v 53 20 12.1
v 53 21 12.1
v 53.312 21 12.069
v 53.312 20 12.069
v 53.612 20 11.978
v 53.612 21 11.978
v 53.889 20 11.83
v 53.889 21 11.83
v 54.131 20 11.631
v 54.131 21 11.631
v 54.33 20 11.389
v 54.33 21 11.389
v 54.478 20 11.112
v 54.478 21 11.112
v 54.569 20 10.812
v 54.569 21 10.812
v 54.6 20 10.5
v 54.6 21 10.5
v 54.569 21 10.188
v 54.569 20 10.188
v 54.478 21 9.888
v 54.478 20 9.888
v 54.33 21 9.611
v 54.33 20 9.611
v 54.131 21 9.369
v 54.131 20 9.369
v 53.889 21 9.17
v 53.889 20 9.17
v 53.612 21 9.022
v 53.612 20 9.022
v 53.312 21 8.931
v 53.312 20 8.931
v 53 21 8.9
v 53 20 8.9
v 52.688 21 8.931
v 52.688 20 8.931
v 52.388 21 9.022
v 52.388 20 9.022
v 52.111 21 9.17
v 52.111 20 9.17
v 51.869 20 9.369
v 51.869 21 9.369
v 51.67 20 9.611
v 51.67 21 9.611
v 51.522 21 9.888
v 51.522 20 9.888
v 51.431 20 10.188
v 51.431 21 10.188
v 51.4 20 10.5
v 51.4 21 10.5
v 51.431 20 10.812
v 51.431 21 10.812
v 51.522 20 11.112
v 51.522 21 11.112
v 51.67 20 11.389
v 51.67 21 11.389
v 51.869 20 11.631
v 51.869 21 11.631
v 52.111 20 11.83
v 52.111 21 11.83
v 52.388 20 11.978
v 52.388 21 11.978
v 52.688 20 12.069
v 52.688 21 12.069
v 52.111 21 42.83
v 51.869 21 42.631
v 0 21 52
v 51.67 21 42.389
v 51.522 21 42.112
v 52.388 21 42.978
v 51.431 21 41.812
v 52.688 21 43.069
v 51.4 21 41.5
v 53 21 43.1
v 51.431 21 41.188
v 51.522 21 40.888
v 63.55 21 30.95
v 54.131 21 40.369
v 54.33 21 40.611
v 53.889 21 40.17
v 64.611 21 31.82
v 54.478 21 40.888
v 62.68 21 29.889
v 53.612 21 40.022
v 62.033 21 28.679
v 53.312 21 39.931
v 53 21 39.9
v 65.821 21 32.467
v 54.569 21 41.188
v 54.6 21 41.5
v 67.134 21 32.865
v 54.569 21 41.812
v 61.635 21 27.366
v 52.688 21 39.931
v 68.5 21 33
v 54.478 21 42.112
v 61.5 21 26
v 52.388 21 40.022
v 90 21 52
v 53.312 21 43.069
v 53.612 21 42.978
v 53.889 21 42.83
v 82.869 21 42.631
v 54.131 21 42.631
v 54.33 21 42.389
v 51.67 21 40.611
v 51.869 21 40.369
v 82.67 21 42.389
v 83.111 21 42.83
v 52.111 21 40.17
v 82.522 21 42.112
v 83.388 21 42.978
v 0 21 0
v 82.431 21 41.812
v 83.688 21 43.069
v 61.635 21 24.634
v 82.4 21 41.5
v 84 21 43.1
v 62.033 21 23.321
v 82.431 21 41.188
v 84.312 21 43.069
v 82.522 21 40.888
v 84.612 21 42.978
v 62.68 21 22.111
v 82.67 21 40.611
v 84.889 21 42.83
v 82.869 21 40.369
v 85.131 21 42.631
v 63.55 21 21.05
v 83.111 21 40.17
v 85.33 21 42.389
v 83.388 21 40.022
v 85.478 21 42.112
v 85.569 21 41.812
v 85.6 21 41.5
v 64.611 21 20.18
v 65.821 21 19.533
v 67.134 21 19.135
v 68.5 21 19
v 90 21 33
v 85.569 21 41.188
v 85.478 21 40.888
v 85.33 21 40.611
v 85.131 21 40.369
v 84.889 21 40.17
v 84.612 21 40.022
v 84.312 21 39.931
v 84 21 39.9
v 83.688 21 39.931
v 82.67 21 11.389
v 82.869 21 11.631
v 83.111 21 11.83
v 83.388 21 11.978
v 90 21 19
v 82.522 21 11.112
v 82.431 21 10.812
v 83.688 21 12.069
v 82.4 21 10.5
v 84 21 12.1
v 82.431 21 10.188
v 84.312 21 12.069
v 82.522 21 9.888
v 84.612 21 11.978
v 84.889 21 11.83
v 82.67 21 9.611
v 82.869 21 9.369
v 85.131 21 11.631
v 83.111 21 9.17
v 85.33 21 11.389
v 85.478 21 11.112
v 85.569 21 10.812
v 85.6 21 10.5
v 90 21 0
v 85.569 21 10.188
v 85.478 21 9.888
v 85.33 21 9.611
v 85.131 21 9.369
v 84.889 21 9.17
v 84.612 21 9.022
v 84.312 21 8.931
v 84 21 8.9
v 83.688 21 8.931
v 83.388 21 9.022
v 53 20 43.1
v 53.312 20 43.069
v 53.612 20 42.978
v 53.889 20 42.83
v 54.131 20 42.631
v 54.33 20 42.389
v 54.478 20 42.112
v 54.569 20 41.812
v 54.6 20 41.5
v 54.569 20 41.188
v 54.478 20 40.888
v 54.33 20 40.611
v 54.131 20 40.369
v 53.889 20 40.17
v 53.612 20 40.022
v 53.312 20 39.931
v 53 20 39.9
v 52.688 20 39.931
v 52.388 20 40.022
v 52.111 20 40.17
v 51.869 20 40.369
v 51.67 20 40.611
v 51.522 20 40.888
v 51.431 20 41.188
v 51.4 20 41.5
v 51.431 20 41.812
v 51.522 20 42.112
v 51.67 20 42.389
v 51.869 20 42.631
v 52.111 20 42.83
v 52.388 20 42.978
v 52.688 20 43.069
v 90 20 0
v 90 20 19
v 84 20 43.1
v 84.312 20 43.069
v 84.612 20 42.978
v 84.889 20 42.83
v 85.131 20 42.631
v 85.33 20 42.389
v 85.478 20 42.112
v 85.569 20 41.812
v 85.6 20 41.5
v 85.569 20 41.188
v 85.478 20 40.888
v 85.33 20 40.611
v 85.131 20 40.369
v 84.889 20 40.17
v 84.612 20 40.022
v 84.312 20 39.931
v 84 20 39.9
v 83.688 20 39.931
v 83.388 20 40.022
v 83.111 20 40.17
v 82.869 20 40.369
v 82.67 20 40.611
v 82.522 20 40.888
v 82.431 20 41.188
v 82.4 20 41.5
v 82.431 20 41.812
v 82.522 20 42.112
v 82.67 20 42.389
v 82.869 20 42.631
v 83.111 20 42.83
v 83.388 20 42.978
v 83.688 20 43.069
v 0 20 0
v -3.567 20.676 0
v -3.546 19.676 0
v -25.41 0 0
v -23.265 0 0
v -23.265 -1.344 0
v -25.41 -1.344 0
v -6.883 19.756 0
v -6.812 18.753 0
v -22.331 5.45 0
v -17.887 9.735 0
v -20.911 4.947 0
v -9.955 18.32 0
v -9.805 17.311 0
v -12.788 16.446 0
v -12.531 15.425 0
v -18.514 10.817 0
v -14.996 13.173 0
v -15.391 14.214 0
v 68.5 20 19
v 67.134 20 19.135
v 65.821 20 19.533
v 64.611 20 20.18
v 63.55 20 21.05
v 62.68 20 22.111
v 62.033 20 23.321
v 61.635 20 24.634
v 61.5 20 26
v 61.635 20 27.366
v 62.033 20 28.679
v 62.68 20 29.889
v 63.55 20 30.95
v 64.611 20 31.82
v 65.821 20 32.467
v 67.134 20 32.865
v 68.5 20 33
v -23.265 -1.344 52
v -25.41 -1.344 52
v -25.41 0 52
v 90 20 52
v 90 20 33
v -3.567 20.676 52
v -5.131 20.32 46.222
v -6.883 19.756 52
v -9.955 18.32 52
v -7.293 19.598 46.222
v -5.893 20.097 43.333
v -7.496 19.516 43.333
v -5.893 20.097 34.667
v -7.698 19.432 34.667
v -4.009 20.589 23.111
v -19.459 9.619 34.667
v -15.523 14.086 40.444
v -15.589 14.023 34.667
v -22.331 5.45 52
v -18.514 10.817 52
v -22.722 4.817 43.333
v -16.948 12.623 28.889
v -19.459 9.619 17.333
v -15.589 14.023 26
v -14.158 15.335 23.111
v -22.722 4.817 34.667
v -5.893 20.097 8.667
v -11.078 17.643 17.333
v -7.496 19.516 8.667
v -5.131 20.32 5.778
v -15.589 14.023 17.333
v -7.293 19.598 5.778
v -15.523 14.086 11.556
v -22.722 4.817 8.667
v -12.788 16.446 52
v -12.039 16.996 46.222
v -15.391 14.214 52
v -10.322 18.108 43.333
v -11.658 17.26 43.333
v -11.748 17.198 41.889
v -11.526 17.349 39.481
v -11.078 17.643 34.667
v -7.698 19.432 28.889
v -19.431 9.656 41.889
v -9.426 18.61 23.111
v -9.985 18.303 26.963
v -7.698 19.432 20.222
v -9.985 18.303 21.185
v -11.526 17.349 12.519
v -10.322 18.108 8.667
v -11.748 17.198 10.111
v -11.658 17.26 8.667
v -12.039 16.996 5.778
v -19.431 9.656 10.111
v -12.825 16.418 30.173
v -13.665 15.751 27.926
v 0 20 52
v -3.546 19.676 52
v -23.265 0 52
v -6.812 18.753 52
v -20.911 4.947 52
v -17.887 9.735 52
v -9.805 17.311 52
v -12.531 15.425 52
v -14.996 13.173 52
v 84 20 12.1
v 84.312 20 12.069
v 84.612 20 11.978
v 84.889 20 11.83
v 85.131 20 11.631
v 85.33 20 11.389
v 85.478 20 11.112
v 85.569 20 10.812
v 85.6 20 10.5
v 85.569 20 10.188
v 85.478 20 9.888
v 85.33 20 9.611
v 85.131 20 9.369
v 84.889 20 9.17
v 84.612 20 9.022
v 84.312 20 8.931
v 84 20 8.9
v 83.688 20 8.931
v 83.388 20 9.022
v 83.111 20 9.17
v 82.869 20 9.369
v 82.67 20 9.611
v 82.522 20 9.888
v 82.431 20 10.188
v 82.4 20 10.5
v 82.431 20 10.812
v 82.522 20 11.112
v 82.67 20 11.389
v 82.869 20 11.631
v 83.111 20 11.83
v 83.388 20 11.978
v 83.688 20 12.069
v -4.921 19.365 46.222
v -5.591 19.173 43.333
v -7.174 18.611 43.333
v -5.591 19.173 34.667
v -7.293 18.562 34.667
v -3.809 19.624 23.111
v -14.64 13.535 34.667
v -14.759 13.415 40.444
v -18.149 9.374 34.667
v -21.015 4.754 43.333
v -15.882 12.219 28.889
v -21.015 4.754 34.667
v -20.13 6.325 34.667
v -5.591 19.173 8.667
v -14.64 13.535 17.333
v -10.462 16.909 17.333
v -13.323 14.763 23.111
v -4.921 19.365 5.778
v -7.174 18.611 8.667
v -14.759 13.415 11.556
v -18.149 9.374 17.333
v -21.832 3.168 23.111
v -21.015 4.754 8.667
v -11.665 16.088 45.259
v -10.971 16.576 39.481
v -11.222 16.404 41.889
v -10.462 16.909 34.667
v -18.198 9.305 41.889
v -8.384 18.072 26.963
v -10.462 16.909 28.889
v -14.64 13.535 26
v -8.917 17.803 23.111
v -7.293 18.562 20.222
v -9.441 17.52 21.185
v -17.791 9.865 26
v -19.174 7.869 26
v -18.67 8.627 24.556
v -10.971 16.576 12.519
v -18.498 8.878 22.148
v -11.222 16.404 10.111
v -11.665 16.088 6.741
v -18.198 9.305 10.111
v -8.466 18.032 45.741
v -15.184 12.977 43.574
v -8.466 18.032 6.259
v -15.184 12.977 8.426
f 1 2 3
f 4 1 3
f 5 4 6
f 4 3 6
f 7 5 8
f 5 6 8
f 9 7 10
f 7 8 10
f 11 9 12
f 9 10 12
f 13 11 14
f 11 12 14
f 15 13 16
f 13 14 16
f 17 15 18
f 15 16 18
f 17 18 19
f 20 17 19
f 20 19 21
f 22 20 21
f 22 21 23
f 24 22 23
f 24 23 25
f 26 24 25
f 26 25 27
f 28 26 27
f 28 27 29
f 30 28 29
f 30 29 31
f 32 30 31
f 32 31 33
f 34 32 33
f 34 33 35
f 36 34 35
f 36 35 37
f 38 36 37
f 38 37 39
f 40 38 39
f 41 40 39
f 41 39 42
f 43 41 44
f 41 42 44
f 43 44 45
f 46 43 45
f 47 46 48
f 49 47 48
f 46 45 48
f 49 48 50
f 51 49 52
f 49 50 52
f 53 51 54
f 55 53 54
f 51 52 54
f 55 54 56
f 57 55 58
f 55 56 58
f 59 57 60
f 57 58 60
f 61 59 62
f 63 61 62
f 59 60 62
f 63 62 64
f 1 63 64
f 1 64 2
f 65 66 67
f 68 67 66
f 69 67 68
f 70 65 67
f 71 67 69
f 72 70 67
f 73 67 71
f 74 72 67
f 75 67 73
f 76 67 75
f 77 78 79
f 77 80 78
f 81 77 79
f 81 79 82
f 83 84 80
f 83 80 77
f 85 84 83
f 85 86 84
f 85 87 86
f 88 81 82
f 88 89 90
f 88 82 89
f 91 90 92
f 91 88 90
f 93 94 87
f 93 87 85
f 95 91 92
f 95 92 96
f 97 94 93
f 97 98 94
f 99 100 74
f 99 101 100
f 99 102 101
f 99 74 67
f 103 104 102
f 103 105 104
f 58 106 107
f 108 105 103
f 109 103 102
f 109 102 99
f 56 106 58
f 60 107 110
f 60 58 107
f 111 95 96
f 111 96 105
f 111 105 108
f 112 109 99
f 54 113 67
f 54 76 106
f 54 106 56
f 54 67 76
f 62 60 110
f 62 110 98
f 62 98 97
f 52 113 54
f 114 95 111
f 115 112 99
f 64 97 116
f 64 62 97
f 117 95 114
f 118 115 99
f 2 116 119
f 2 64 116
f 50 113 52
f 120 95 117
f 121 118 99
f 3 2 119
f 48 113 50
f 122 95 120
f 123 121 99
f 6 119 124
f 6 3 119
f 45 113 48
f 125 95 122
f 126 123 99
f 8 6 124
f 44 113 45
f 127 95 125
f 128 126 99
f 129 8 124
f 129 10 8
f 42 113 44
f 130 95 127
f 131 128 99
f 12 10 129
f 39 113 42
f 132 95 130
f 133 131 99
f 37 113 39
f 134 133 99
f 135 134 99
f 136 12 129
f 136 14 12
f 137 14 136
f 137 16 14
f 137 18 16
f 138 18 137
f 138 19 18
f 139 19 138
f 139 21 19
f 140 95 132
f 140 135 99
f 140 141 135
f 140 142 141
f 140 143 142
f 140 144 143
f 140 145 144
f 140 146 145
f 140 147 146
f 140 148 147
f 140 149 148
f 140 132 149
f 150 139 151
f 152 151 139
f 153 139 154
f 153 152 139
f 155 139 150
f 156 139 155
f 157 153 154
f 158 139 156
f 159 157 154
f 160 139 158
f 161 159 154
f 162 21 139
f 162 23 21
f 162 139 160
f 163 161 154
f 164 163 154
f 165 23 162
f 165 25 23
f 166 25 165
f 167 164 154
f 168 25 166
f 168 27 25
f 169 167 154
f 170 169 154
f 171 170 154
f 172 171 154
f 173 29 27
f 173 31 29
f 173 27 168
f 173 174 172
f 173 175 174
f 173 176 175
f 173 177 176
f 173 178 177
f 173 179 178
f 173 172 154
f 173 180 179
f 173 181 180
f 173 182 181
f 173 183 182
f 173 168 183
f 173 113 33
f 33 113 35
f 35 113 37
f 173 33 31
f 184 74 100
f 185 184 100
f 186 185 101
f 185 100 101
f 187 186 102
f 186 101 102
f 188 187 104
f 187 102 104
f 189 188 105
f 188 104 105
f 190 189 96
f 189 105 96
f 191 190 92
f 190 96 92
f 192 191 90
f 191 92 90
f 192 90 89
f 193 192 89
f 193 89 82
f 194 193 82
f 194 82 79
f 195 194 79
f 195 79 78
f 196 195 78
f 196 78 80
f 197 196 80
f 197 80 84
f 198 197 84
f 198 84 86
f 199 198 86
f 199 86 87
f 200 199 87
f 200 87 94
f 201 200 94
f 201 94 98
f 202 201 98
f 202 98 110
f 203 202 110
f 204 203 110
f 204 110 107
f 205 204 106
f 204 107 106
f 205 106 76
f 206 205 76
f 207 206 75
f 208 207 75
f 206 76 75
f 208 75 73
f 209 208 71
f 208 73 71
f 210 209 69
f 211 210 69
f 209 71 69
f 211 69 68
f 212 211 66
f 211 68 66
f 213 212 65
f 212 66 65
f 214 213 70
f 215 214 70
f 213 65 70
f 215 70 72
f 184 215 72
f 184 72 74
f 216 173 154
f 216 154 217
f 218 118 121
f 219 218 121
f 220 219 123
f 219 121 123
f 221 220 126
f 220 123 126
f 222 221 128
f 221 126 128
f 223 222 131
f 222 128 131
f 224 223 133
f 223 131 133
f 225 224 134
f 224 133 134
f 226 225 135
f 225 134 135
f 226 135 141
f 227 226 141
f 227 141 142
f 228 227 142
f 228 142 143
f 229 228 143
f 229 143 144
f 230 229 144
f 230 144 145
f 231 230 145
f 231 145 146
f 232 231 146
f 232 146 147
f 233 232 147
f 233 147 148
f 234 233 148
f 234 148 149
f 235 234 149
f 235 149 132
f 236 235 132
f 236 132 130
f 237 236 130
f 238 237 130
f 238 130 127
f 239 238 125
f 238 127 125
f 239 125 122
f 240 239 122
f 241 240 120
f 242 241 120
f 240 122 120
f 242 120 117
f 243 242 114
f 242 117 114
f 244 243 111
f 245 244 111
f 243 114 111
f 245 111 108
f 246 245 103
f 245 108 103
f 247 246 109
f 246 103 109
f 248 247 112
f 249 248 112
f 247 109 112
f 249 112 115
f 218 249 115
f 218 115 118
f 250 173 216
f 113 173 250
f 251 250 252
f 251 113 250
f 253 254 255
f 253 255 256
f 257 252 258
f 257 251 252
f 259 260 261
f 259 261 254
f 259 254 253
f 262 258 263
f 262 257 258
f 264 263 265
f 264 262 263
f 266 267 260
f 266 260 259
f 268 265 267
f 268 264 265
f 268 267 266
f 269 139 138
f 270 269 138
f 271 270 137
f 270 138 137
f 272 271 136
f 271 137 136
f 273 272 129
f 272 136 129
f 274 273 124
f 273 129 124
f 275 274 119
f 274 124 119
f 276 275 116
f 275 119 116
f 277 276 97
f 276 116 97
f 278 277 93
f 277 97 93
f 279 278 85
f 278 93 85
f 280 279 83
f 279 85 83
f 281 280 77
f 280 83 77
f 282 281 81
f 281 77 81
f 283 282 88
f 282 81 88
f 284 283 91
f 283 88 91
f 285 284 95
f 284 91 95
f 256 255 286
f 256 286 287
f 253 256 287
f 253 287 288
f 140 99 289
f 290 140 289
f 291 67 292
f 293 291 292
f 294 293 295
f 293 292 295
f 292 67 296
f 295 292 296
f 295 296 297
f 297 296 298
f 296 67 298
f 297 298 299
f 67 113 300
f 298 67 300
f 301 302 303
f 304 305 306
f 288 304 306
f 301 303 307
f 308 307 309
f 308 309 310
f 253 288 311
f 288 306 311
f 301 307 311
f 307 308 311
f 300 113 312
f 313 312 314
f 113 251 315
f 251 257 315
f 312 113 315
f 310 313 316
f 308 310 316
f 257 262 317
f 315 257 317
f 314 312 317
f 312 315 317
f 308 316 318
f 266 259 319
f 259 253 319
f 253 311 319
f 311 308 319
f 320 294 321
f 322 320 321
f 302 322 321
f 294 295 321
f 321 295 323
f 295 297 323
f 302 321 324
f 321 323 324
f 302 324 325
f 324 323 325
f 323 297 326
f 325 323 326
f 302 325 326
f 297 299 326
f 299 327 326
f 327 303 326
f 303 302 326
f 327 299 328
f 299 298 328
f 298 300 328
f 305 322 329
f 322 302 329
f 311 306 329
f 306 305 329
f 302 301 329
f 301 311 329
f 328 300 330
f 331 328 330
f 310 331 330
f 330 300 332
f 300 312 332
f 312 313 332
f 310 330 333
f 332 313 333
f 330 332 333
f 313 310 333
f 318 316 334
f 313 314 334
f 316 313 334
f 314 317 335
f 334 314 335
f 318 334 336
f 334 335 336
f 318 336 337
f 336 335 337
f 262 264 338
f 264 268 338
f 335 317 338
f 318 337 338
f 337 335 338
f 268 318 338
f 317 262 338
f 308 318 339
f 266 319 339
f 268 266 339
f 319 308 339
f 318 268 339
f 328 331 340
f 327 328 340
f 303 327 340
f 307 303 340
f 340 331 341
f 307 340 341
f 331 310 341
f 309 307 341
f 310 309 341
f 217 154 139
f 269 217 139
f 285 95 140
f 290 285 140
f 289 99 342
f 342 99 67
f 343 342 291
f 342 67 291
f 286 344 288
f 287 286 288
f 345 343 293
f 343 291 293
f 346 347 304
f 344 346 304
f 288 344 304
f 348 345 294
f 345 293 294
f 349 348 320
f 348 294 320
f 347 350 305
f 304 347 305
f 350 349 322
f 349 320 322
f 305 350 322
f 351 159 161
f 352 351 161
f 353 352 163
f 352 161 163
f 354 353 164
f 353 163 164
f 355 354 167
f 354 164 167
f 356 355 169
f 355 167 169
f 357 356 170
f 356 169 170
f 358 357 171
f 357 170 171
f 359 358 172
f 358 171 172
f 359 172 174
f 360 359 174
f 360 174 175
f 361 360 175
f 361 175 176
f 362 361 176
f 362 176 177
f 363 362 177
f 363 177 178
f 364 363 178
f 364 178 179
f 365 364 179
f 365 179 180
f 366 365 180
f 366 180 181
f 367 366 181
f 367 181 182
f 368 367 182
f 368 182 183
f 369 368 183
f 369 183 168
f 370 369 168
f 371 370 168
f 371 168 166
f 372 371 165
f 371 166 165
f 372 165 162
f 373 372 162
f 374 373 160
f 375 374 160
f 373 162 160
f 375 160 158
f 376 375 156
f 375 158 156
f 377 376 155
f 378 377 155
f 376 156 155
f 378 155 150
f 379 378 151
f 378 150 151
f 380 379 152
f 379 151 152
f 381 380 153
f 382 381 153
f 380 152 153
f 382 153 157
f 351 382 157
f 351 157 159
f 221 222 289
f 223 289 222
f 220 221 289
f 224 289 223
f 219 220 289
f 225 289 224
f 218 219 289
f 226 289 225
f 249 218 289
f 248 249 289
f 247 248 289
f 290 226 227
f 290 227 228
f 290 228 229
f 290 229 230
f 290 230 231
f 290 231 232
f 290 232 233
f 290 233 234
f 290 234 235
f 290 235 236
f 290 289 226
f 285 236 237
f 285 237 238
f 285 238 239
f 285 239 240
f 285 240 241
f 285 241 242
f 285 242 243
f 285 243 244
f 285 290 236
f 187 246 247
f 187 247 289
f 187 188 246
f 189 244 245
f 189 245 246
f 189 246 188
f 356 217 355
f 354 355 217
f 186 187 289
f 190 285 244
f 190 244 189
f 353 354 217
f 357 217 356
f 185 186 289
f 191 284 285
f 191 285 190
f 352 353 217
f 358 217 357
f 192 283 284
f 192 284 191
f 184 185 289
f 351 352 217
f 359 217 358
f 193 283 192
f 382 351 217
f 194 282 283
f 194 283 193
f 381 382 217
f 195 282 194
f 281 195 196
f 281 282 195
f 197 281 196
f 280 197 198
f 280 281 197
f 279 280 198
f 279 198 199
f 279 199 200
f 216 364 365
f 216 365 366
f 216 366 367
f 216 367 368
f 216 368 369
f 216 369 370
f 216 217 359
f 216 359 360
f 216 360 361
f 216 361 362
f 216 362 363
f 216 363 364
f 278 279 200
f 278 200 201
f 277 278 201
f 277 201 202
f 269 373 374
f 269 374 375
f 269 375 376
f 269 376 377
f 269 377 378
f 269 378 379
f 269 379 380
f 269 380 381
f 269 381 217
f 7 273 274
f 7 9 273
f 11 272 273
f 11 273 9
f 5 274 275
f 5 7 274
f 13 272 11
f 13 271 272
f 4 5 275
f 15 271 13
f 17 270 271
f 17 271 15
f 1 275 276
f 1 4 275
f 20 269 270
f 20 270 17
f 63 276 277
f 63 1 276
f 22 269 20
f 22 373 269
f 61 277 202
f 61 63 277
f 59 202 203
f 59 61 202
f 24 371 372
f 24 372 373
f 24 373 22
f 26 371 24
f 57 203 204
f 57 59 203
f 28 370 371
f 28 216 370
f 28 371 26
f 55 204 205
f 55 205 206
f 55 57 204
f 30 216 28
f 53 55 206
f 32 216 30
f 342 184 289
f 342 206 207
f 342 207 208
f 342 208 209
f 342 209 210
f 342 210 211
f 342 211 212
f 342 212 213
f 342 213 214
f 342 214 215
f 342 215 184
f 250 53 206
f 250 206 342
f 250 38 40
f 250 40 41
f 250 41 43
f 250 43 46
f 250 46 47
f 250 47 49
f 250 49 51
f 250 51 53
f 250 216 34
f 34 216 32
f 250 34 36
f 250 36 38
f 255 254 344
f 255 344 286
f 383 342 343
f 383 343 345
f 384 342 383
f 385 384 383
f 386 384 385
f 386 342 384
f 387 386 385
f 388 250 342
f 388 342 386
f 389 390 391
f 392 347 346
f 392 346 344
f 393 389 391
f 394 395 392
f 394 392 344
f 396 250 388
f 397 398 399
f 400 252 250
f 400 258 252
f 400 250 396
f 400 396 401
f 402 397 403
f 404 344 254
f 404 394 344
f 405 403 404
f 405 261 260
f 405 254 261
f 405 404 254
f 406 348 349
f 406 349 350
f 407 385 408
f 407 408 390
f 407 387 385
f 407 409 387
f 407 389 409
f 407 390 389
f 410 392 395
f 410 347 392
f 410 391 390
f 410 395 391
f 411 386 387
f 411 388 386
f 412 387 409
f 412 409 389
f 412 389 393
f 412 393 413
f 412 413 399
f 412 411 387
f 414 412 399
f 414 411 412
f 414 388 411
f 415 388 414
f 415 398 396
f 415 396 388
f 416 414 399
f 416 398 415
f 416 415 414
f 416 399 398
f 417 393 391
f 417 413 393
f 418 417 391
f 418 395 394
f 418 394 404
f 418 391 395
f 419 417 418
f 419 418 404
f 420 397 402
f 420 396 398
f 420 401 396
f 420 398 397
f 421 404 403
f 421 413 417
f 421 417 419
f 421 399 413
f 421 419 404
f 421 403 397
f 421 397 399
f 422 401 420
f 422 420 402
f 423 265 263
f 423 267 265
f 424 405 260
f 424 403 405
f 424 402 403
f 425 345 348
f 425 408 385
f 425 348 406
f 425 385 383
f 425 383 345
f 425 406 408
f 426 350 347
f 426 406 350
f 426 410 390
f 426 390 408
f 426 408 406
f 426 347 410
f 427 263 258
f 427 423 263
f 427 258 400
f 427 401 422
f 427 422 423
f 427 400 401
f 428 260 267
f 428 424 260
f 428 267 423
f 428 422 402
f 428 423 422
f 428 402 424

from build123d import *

# Parameters (mm, degrees)
EXTRUDE_1_DEPTH     = 52
SKETCH_3_R          = 1.6
CUT_EXTRUDE_1_DEPTH = 52


with BuildPart() as part:
    # 草图2 → 凸台-拉伸1 (new body)
    with BuildSketch(Plane.XY):
        with BuildLine():
            Line((0, 21), (90, 21))
            Line((90, 21), (90, 20))
            Line((90, 20), (0, 20))
            add(Edge.make_bspline(
                [(0, 20), (-11.918826451, 20), (-19.365080243, 9.425379896), (-23.265119014, 0)],
                knots=[0, 0, 0, 0, 1, 1, 1, 1], degree=3))
            Line((-23.265119014, 0), (-23.265119014, -1.344088089))
            Line((-23.265119014, -1.344088089), (-25.409868427, -1.344088089))
            Line((-25.409868427, -1.344088089), (-25.409868427, 0))
            add(Edge.make_bspline(
                [(0, 21), (-12.514575739, 21), (-20.585292942, 9.393477036), (-25.409868427, 0)],
                knots=[0, 0, 0, 0, 1, 1, 1, 1], degree=3))
        make_face()
    extrude(amount=EXTRUDE_1_DEPTH)

    # 草图3 → 切除-拉伸1 (cut)
    with BuildSketch(Plane(origin=(0, 21, 0), x_dir=(1, 0, 0), z_dir=(0, 1, 0))):
        with Locations(Location((84, -10.5, 0), (0, 0, 270))):
            Circle(SKETCH_3_R)
        with Locations(Location((84, -41.5, 0), (0, 0, 270))):
            Circle(SKETCH_3_R)
        with Locations(Location((53, -41.5, 0), (0, 0, 270))):
            Circle(SKETCH_3_R)
        with Locations(Location((53, -10.5, 0), (0, 0, 270))):
            Circle(SKETCH_3_R)
        with BuildLine():
            Line((90, -19), (68.5, -19))
            ThreePointArc((68.5, -19), (61.5, -26), (68.5, -33))
            Line((68.5, -33), (90, -33))
            Line((90, -33), (90, -19))
        make_face()
    extrude(amount=-CUT_EXTRUDE_1_DEPTH, mode=Mode.SUBTRACT)


solid = part.part
